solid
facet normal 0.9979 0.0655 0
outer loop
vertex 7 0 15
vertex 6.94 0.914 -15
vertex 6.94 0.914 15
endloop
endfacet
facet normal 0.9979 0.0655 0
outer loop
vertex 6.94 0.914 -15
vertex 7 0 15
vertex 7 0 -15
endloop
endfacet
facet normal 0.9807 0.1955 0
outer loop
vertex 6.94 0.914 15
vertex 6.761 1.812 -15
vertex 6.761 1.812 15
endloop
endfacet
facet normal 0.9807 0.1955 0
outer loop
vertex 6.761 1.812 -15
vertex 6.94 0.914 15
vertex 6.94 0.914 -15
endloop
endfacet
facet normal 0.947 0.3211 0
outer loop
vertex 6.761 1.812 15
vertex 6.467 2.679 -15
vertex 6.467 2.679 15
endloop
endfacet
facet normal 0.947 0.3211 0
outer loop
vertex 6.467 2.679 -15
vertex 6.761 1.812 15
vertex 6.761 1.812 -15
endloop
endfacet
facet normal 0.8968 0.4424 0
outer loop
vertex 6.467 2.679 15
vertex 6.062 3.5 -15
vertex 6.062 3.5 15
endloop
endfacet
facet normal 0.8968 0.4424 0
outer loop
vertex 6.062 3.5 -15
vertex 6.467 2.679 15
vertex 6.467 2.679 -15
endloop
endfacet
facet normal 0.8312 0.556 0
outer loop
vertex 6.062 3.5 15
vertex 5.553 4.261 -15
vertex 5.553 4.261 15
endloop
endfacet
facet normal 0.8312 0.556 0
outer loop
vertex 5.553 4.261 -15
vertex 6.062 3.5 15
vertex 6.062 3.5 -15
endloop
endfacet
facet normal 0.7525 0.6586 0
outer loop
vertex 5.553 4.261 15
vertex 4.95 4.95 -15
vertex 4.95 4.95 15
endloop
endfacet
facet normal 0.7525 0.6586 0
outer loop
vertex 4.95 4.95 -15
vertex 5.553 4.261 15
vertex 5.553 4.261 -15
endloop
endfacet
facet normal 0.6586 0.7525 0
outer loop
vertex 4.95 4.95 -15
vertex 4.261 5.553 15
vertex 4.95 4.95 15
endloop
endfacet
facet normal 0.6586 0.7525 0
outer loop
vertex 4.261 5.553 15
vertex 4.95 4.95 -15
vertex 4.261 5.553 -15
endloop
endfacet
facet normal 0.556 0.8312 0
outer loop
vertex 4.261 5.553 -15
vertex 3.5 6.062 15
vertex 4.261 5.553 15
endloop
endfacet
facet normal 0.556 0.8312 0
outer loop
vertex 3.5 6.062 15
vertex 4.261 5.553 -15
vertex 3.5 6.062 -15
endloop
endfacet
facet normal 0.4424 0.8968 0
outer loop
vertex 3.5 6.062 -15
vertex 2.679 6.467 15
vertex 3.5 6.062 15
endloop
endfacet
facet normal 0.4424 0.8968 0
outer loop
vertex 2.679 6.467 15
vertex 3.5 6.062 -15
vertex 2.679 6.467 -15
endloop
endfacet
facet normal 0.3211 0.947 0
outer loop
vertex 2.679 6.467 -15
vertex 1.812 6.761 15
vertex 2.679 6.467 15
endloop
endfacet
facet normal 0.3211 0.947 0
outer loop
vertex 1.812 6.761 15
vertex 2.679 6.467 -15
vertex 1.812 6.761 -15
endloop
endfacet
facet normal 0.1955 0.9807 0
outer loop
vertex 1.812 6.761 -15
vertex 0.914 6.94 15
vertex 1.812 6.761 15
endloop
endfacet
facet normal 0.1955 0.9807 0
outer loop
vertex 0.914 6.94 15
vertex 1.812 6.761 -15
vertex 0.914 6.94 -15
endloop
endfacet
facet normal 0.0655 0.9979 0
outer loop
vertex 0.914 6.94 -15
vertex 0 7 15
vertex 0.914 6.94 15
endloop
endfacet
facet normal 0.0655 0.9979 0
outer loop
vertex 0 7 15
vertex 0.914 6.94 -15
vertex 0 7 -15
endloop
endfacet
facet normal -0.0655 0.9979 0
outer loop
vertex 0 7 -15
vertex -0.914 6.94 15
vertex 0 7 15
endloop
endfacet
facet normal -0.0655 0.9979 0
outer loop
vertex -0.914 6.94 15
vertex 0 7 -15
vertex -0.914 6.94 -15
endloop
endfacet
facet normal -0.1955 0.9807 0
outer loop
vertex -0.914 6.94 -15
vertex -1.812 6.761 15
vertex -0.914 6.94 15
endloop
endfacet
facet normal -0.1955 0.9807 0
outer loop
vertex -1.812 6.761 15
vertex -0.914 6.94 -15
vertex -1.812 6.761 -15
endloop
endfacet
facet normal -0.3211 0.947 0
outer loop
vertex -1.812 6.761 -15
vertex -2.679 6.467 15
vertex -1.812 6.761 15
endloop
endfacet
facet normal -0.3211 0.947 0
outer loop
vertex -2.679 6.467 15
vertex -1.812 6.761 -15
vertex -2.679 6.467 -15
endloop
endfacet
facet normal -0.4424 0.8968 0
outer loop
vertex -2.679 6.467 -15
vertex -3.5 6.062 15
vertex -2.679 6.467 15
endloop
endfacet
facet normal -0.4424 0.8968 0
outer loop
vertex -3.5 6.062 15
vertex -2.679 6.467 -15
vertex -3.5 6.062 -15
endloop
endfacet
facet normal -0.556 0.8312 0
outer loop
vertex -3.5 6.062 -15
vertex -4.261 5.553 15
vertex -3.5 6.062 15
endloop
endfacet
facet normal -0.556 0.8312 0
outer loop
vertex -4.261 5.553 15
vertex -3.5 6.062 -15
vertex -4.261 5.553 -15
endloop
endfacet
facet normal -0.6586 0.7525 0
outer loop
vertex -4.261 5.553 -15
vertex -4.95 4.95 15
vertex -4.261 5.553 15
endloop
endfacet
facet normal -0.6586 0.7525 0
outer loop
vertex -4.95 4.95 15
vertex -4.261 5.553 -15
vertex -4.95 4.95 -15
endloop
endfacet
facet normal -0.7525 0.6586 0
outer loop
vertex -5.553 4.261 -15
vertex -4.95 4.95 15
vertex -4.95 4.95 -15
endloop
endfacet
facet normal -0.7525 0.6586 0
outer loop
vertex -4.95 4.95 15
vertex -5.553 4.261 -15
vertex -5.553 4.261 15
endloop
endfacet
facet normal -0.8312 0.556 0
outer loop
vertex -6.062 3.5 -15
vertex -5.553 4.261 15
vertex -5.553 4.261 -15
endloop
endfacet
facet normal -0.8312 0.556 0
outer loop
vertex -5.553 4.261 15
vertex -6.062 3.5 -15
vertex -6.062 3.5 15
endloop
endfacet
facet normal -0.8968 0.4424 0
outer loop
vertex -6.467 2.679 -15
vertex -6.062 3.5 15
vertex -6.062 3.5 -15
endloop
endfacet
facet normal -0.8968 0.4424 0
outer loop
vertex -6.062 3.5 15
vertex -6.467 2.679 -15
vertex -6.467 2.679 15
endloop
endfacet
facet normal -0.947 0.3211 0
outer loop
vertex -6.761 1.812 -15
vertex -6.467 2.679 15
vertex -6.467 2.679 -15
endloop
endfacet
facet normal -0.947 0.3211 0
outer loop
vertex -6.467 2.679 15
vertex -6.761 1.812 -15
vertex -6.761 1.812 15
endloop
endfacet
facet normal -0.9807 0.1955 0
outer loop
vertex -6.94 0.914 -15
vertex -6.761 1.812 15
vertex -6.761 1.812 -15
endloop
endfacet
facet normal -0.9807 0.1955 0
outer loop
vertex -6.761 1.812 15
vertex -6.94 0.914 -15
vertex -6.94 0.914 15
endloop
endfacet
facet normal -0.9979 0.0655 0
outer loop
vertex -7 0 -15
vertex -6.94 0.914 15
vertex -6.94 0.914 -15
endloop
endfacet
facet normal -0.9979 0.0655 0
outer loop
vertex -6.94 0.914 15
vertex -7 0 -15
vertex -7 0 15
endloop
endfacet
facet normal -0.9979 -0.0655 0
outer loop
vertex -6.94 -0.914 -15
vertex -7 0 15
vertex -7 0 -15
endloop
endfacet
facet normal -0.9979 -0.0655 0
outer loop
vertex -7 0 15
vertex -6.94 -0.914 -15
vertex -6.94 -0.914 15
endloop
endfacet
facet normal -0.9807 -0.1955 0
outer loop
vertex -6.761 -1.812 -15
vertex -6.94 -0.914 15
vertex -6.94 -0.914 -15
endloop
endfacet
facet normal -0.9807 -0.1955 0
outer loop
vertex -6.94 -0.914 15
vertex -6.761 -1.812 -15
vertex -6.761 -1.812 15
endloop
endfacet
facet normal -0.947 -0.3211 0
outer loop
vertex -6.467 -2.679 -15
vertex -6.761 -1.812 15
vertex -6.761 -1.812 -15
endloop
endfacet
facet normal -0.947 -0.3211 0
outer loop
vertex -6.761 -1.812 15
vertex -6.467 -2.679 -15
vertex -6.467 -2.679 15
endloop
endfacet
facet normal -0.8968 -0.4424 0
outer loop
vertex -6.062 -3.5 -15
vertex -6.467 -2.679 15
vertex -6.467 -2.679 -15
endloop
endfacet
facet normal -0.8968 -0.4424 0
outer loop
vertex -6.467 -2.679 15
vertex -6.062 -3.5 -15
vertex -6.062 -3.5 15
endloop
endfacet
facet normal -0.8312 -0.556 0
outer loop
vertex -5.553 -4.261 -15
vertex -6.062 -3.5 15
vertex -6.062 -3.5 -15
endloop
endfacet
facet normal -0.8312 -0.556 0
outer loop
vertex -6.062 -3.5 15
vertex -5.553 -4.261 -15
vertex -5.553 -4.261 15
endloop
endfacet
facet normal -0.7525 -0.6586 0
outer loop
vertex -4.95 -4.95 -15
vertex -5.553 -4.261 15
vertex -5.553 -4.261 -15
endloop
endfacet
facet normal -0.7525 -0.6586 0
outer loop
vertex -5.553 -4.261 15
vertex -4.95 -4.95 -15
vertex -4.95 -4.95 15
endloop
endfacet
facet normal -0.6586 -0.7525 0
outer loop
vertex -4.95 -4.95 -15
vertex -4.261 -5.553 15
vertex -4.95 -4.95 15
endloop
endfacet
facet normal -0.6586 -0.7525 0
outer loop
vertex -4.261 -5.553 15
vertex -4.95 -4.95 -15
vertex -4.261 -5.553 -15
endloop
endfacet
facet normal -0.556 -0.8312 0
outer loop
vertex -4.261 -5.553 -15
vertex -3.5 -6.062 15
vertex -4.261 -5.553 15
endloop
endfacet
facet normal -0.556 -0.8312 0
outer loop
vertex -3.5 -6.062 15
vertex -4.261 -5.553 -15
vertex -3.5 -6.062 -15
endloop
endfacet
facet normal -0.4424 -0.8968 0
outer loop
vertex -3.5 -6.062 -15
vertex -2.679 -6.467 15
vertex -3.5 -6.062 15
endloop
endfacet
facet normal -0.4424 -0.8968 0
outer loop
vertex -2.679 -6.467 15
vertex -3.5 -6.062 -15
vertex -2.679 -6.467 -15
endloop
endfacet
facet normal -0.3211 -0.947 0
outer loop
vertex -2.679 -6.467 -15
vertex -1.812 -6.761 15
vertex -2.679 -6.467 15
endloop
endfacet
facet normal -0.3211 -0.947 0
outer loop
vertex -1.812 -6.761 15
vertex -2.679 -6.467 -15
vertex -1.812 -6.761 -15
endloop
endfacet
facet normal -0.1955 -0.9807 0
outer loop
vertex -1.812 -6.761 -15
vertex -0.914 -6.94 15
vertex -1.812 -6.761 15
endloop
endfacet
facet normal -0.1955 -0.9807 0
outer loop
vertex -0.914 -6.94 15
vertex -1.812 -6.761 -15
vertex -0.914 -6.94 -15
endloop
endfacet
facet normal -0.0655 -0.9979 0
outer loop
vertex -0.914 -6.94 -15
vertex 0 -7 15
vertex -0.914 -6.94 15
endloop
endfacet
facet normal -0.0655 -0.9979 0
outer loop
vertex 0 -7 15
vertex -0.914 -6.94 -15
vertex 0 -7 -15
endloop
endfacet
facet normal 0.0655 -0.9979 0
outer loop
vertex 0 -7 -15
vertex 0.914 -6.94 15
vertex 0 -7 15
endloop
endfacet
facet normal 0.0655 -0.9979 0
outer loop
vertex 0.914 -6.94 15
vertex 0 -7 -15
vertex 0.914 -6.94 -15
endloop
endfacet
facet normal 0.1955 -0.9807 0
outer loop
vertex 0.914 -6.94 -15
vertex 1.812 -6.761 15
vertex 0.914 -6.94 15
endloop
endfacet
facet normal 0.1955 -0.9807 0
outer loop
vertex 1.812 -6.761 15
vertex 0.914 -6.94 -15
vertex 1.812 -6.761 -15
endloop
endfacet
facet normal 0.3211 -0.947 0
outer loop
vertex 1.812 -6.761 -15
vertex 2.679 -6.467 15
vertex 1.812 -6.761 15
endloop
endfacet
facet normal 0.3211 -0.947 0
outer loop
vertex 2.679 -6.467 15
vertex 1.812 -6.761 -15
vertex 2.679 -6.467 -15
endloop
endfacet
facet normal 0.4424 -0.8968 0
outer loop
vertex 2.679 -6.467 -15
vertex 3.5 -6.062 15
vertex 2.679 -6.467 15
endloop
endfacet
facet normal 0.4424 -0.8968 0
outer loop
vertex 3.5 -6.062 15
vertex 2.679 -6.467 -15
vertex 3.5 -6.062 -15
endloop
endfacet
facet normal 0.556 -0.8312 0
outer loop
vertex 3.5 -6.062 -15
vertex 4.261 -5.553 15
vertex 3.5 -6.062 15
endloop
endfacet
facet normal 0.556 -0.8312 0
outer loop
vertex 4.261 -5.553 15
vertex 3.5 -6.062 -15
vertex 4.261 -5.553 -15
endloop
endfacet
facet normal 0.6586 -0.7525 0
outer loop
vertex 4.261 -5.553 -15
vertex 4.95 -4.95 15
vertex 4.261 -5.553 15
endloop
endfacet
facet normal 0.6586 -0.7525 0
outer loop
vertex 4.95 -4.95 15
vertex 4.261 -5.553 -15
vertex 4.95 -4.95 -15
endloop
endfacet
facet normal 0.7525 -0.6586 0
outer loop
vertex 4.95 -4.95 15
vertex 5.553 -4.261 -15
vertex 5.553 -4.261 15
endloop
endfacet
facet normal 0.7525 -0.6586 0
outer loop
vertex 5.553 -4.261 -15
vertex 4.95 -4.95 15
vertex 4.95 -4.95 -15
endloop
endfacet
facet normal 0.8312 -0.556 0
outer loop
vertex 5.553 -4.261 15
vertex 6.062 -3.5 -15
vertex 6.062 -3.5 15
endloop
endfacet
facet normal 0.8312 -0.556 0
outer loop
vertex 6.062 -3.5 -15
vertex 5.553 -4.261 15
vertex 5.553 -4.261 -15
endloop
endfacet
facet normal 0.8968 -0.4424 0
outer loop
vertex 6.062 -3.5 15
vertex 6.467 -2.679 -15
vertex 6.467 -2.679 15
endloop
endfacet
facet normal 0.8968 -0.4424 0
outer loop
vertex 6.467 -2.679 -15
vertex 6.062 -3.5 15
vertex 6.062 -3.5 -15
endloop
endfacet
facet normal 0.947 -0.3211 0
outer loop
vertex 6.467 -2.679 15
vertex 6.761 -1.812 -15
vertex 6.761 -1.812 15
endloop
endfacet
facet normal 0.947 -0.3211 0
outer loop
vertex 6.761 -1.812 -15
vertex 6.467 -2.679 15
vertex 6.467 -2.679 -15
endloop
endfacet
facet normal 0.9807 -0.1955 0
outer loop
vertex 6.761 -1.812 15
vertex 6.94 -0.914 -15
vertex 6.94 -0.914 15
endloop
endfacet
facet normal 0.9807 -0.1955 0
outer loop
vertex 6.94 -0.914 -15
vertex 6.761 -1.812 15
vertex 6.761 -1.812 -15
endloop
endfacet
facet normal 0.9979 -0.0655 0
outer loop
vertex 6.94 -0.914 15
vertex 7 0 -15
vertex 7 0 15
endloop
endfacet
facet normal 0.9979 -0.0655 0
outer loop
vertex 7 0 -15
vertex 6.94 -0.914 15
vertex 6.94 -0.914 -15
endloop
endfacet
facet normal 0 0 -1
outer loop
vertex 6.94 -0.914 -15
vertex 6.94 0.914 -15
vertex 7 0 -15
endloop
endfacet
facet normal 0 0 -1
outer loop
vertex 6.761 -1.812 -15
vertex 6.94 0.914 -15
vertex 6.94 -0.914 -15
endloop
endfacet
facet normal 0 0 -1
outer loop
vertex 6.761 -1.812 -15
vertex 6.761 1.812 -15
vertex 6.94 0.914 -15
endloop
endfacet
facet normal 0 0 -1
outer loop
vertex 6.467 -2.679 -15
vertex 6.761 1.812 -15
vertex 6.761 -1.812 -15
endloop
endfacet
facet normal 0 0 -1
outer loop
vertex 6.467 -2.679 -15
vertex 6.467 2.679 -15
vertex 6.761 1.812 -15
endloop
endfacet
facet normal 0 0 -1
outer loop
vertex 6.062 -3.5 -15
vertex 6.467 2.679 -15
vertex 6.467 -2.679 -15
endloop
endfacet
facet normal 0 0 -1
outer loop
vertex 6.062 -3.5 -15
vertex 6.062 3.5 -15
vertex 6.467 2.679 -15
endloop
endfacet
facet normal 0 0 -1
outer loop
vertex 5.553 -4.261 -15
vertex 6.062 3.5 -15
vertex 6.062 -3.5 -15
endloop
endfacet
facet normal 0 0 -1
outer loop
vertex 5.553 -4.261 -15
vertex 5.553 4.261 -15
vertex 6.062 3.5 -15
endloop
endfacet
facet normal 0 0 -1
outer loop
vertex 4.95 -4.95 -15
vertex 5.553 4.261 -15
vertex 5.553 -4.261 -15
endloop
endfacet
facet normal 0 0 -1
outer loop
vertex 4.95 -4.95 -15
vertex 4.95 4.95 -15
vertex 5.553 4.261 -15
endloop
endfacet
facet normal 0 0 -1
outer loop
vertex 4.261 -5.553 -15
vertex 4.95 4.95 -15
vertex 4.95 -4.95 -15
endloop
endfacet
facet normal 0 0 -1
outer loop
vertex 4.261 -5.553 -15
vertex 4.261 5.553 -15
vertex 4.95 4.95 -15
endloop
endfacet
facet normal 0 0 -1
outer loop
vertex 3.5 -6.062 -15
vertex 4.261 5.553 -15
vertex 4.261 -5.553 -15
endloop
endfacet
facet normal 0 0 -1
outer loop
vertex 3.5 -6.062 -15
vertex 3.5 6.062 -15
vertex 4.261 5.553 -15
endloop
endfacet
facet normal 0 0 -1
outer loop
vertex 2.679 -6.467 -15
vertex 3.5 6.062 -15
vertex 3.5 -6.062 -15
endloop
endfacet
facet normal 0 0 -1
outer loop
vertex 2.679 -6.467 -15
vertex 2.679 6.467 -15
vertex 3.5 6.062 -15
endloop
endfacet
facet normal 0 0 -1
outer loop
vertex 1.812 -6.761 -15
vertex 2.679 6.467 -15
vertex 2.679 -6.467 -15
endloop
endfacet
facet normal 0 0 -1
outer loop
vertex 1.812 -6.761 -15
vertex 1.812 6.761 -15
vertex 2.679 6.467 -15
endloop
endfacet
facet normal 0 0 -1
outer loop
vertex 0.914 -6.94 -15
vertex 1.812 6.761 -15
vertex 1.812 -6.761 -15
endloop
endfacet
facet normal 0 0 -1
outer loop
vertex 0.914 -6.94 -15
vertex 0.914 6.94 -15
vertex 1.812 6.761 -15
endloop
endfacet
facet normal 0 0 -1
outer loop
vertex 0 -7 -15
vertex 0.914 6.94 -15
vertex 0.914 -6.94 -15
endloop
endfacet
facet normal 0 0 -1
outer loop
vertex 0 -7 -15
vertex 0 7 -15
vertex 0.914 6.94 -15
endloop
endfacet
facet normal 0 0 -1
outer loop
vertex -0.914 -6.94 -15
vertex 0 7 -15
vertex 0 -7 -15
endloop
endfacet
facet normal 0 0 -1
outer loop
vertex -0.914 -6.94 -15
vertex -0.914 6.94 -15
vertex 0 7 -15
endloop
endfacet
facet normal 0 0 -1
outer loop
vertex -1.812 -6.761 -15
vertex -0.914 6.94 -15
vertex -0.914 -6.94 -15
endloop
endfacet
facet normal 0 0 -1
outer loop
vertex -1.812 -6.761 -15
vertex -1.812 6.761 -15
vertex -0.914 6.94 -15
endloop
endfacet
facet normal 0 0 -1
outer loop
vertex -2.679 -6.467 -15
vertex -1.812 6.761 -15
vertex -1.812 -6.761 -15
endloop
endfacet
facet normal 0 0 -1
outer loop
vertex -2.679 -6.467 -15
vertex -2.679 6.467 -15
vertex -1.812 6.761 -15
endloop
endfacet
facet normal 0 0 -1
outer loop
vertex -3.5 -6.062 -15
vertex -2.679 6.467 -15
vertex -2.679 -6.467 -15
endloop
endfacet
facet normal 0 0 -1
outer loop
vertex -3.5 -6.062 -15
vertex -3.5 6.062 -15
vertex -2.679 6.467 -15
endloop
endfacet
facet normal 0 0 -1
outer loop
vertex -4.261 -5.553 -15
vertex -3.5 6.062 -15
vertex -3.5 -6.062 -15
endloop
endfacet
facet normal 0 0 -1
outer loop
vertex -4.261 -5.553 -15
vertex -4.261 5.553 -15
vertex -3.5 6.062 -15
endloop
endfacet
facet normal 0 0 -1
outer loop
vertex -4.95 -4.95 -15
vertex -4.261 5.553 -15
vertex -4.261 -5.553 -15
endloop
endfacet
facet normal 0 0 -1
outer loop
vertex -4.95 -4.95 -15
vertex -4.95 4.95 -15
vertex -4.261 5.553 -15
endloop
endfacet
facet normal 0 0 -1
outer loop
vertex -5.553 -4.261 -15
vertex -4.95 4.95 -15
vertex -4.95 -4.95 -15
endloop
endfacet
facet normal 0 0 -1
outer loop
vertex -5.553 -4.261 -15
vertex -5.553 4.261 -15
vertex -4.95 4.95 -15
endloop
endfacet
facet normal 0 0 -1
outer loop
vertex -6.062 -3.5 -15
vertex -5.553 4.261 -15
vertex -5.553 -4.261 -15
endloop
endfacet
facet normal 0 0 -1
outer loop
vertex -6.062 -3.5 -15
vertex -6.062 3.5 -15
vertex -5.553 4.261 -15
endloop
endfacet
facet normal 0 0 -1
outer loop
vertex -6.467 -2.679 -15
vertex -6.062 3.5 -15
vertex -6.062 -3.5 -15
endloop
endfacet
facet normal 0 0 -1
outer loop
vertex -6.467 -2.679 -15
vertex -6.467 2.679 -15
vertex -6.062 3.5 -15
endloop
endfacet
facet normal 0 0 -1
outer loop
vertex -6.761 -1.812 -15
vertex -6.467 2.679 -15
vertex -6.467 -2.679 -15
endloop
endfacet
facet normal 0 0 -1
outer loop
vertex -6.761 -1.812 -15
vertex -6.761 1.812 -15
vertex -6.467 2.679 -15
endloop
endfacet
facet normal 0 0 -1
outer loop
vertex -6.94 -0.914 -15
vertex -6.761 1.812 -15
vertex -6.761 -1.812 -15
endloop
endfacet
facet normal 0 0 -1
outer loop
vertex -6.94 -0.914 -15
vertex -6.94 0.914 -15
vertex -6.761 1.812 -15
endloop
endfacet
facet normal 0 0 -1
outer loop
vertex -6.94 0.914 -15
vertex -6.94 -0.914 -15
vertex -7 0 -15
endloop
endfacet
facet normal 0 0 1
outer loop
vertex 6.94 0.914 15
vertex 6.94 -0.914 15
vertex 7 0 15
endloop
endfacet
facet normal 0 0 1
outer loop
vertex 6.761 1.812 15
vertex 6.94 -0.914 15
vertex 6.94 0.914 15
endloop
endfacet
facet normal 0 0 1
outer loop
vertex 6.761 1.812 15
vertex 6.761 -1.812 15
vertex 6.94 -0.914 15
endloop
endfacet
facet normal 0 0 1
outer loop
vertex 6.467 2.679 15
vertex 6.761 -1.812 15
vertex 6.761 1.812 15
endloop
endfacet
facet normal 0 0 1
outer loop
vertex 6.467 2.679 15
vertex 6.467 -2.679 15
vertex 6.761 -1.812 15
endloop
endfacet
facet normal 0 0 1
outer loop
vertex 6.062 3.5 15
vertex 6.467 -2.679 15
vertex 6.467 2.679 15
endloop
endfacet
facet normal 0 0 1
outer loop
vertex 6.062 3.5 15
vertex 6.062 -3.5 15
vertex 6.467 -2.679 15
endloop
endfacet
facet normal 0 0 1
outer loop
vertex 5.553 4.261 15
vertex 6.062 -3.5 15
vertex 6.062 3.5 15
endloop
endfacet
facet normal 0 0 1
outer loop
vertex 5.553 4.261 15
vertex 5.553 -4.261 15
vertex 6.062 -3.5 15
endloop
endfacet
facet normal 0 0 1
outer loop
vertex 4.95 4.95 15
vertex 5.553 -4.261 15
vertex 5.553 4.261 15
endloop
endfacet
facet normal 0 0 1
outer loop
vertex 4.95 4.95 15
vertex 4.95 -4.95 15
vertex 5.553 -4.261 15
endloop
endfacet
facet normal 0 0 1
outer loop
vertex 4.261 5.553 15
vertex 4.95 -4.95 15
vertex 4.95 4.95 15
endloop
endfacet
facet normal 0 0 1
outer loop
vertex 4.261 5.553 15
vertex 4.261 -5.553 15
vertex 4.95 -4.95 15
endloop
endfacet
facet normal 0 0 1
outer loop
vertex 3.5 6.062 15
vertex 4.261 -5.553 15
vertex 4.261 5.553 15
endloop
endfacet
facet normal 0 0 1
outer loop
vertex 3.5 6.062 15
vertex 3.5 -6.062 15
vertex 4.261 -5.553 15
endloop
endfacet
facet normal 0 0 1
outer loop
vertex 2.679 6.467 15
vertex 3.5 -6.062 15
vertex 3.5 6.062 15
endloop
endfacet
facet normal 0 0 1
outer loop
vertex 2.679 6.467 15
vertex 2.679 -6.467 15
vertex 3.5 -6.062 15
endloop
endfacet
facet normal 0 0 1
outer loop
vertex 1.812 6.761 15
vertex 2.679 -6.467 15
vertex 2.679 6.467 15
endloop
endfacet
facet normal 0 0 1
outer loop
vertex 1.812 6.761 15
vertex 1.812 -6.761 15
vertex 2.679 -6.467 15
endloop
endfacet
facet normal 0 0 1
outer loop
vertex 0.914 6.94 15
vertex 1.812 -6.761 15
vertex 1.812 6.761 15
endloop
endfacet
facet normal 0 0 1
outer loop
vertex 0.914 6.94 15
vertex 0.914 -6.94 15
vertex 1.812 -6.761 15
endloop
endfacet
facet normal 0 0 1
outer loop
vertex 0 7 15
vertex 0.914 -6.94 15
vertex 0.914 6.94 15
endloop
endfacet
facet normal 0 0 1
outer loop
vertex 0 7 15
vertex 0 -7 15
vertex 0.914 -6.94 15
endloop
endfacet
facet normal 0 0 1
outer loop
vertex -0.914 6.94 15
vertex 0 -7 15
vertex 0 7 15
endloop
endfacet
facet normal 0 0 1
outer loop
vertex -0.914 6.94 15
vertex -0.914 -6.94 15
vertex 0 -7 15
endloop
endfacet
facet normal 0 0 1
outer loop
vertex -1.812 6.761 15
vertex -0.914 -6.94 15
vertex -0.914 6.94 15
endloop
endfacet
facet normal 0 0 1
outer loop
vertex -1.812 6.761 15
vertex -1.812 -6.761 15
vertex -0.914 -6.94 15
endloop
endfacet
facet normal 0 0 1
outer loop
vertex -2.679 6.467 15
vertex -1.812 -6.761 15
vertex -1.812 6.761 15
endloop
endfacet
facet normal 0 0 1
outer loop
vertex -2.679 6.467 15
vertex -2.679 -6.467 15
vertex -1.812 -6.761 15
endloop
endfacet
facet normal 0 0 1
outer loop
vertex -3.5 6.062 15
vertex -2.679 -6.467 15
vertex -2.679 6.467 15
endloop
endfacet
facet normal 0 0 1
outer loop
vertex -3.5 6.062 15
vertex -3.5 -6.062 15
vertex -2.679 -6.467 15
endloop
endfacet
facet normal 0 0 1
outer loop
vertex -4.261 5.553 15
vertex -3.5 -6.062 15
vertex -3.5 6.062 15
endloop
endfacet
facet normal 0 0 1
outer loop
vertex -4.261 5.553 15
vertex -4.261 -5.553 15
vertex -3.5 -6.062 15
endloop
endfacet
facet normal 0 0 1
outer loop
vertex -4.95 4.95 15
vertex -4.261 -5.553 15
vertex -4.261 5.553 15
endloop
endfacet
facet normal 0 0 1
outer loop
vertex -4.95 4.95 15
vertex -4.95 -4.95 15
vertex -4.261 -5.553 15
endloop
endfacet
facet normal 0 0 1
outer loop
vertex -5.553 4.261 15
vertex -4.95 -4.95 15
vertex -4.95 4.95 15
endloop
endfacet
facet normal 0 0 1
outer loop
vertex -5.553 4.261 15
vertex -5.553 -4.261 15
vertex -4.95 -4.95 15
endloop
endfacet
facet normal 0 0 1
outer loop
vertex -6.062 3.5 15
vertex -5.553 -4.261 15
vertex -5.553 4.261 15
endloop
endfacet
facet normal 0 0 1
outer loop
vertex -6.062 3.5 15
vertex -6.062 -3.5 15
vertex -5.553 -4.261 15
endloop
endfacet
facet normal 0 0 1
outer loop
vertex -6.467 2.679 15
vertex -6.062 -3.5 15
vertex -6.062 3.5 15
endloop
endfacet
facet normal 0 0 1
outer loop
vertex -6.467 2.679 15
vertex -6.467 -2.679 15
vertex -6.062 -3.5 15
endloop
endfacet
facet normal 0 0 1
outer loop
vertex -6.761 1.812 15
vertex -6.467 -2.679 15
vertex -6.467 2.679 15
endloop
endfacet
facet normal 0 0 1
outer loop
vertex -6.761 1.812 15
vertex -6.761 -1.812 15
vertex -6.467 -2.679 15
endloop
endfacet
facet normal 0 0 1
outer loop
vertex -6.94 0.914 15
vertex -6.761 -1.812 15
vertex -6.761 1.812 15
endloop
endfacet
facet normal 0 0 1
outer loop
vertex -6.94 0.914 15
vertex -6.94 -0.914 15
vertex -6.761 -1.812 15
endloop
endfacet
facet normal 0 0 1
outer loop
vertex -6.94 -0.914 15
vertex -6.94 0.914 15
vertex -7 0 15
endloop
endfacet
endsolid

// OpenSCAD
// ========================================
// a cylinder with radius 7 mm and height 30 mm
// NeuroCAD canonical IR; dimensions are millimetres
// ========================================
$fn = 48;

cylinder(r=7, h=30, center=true);
